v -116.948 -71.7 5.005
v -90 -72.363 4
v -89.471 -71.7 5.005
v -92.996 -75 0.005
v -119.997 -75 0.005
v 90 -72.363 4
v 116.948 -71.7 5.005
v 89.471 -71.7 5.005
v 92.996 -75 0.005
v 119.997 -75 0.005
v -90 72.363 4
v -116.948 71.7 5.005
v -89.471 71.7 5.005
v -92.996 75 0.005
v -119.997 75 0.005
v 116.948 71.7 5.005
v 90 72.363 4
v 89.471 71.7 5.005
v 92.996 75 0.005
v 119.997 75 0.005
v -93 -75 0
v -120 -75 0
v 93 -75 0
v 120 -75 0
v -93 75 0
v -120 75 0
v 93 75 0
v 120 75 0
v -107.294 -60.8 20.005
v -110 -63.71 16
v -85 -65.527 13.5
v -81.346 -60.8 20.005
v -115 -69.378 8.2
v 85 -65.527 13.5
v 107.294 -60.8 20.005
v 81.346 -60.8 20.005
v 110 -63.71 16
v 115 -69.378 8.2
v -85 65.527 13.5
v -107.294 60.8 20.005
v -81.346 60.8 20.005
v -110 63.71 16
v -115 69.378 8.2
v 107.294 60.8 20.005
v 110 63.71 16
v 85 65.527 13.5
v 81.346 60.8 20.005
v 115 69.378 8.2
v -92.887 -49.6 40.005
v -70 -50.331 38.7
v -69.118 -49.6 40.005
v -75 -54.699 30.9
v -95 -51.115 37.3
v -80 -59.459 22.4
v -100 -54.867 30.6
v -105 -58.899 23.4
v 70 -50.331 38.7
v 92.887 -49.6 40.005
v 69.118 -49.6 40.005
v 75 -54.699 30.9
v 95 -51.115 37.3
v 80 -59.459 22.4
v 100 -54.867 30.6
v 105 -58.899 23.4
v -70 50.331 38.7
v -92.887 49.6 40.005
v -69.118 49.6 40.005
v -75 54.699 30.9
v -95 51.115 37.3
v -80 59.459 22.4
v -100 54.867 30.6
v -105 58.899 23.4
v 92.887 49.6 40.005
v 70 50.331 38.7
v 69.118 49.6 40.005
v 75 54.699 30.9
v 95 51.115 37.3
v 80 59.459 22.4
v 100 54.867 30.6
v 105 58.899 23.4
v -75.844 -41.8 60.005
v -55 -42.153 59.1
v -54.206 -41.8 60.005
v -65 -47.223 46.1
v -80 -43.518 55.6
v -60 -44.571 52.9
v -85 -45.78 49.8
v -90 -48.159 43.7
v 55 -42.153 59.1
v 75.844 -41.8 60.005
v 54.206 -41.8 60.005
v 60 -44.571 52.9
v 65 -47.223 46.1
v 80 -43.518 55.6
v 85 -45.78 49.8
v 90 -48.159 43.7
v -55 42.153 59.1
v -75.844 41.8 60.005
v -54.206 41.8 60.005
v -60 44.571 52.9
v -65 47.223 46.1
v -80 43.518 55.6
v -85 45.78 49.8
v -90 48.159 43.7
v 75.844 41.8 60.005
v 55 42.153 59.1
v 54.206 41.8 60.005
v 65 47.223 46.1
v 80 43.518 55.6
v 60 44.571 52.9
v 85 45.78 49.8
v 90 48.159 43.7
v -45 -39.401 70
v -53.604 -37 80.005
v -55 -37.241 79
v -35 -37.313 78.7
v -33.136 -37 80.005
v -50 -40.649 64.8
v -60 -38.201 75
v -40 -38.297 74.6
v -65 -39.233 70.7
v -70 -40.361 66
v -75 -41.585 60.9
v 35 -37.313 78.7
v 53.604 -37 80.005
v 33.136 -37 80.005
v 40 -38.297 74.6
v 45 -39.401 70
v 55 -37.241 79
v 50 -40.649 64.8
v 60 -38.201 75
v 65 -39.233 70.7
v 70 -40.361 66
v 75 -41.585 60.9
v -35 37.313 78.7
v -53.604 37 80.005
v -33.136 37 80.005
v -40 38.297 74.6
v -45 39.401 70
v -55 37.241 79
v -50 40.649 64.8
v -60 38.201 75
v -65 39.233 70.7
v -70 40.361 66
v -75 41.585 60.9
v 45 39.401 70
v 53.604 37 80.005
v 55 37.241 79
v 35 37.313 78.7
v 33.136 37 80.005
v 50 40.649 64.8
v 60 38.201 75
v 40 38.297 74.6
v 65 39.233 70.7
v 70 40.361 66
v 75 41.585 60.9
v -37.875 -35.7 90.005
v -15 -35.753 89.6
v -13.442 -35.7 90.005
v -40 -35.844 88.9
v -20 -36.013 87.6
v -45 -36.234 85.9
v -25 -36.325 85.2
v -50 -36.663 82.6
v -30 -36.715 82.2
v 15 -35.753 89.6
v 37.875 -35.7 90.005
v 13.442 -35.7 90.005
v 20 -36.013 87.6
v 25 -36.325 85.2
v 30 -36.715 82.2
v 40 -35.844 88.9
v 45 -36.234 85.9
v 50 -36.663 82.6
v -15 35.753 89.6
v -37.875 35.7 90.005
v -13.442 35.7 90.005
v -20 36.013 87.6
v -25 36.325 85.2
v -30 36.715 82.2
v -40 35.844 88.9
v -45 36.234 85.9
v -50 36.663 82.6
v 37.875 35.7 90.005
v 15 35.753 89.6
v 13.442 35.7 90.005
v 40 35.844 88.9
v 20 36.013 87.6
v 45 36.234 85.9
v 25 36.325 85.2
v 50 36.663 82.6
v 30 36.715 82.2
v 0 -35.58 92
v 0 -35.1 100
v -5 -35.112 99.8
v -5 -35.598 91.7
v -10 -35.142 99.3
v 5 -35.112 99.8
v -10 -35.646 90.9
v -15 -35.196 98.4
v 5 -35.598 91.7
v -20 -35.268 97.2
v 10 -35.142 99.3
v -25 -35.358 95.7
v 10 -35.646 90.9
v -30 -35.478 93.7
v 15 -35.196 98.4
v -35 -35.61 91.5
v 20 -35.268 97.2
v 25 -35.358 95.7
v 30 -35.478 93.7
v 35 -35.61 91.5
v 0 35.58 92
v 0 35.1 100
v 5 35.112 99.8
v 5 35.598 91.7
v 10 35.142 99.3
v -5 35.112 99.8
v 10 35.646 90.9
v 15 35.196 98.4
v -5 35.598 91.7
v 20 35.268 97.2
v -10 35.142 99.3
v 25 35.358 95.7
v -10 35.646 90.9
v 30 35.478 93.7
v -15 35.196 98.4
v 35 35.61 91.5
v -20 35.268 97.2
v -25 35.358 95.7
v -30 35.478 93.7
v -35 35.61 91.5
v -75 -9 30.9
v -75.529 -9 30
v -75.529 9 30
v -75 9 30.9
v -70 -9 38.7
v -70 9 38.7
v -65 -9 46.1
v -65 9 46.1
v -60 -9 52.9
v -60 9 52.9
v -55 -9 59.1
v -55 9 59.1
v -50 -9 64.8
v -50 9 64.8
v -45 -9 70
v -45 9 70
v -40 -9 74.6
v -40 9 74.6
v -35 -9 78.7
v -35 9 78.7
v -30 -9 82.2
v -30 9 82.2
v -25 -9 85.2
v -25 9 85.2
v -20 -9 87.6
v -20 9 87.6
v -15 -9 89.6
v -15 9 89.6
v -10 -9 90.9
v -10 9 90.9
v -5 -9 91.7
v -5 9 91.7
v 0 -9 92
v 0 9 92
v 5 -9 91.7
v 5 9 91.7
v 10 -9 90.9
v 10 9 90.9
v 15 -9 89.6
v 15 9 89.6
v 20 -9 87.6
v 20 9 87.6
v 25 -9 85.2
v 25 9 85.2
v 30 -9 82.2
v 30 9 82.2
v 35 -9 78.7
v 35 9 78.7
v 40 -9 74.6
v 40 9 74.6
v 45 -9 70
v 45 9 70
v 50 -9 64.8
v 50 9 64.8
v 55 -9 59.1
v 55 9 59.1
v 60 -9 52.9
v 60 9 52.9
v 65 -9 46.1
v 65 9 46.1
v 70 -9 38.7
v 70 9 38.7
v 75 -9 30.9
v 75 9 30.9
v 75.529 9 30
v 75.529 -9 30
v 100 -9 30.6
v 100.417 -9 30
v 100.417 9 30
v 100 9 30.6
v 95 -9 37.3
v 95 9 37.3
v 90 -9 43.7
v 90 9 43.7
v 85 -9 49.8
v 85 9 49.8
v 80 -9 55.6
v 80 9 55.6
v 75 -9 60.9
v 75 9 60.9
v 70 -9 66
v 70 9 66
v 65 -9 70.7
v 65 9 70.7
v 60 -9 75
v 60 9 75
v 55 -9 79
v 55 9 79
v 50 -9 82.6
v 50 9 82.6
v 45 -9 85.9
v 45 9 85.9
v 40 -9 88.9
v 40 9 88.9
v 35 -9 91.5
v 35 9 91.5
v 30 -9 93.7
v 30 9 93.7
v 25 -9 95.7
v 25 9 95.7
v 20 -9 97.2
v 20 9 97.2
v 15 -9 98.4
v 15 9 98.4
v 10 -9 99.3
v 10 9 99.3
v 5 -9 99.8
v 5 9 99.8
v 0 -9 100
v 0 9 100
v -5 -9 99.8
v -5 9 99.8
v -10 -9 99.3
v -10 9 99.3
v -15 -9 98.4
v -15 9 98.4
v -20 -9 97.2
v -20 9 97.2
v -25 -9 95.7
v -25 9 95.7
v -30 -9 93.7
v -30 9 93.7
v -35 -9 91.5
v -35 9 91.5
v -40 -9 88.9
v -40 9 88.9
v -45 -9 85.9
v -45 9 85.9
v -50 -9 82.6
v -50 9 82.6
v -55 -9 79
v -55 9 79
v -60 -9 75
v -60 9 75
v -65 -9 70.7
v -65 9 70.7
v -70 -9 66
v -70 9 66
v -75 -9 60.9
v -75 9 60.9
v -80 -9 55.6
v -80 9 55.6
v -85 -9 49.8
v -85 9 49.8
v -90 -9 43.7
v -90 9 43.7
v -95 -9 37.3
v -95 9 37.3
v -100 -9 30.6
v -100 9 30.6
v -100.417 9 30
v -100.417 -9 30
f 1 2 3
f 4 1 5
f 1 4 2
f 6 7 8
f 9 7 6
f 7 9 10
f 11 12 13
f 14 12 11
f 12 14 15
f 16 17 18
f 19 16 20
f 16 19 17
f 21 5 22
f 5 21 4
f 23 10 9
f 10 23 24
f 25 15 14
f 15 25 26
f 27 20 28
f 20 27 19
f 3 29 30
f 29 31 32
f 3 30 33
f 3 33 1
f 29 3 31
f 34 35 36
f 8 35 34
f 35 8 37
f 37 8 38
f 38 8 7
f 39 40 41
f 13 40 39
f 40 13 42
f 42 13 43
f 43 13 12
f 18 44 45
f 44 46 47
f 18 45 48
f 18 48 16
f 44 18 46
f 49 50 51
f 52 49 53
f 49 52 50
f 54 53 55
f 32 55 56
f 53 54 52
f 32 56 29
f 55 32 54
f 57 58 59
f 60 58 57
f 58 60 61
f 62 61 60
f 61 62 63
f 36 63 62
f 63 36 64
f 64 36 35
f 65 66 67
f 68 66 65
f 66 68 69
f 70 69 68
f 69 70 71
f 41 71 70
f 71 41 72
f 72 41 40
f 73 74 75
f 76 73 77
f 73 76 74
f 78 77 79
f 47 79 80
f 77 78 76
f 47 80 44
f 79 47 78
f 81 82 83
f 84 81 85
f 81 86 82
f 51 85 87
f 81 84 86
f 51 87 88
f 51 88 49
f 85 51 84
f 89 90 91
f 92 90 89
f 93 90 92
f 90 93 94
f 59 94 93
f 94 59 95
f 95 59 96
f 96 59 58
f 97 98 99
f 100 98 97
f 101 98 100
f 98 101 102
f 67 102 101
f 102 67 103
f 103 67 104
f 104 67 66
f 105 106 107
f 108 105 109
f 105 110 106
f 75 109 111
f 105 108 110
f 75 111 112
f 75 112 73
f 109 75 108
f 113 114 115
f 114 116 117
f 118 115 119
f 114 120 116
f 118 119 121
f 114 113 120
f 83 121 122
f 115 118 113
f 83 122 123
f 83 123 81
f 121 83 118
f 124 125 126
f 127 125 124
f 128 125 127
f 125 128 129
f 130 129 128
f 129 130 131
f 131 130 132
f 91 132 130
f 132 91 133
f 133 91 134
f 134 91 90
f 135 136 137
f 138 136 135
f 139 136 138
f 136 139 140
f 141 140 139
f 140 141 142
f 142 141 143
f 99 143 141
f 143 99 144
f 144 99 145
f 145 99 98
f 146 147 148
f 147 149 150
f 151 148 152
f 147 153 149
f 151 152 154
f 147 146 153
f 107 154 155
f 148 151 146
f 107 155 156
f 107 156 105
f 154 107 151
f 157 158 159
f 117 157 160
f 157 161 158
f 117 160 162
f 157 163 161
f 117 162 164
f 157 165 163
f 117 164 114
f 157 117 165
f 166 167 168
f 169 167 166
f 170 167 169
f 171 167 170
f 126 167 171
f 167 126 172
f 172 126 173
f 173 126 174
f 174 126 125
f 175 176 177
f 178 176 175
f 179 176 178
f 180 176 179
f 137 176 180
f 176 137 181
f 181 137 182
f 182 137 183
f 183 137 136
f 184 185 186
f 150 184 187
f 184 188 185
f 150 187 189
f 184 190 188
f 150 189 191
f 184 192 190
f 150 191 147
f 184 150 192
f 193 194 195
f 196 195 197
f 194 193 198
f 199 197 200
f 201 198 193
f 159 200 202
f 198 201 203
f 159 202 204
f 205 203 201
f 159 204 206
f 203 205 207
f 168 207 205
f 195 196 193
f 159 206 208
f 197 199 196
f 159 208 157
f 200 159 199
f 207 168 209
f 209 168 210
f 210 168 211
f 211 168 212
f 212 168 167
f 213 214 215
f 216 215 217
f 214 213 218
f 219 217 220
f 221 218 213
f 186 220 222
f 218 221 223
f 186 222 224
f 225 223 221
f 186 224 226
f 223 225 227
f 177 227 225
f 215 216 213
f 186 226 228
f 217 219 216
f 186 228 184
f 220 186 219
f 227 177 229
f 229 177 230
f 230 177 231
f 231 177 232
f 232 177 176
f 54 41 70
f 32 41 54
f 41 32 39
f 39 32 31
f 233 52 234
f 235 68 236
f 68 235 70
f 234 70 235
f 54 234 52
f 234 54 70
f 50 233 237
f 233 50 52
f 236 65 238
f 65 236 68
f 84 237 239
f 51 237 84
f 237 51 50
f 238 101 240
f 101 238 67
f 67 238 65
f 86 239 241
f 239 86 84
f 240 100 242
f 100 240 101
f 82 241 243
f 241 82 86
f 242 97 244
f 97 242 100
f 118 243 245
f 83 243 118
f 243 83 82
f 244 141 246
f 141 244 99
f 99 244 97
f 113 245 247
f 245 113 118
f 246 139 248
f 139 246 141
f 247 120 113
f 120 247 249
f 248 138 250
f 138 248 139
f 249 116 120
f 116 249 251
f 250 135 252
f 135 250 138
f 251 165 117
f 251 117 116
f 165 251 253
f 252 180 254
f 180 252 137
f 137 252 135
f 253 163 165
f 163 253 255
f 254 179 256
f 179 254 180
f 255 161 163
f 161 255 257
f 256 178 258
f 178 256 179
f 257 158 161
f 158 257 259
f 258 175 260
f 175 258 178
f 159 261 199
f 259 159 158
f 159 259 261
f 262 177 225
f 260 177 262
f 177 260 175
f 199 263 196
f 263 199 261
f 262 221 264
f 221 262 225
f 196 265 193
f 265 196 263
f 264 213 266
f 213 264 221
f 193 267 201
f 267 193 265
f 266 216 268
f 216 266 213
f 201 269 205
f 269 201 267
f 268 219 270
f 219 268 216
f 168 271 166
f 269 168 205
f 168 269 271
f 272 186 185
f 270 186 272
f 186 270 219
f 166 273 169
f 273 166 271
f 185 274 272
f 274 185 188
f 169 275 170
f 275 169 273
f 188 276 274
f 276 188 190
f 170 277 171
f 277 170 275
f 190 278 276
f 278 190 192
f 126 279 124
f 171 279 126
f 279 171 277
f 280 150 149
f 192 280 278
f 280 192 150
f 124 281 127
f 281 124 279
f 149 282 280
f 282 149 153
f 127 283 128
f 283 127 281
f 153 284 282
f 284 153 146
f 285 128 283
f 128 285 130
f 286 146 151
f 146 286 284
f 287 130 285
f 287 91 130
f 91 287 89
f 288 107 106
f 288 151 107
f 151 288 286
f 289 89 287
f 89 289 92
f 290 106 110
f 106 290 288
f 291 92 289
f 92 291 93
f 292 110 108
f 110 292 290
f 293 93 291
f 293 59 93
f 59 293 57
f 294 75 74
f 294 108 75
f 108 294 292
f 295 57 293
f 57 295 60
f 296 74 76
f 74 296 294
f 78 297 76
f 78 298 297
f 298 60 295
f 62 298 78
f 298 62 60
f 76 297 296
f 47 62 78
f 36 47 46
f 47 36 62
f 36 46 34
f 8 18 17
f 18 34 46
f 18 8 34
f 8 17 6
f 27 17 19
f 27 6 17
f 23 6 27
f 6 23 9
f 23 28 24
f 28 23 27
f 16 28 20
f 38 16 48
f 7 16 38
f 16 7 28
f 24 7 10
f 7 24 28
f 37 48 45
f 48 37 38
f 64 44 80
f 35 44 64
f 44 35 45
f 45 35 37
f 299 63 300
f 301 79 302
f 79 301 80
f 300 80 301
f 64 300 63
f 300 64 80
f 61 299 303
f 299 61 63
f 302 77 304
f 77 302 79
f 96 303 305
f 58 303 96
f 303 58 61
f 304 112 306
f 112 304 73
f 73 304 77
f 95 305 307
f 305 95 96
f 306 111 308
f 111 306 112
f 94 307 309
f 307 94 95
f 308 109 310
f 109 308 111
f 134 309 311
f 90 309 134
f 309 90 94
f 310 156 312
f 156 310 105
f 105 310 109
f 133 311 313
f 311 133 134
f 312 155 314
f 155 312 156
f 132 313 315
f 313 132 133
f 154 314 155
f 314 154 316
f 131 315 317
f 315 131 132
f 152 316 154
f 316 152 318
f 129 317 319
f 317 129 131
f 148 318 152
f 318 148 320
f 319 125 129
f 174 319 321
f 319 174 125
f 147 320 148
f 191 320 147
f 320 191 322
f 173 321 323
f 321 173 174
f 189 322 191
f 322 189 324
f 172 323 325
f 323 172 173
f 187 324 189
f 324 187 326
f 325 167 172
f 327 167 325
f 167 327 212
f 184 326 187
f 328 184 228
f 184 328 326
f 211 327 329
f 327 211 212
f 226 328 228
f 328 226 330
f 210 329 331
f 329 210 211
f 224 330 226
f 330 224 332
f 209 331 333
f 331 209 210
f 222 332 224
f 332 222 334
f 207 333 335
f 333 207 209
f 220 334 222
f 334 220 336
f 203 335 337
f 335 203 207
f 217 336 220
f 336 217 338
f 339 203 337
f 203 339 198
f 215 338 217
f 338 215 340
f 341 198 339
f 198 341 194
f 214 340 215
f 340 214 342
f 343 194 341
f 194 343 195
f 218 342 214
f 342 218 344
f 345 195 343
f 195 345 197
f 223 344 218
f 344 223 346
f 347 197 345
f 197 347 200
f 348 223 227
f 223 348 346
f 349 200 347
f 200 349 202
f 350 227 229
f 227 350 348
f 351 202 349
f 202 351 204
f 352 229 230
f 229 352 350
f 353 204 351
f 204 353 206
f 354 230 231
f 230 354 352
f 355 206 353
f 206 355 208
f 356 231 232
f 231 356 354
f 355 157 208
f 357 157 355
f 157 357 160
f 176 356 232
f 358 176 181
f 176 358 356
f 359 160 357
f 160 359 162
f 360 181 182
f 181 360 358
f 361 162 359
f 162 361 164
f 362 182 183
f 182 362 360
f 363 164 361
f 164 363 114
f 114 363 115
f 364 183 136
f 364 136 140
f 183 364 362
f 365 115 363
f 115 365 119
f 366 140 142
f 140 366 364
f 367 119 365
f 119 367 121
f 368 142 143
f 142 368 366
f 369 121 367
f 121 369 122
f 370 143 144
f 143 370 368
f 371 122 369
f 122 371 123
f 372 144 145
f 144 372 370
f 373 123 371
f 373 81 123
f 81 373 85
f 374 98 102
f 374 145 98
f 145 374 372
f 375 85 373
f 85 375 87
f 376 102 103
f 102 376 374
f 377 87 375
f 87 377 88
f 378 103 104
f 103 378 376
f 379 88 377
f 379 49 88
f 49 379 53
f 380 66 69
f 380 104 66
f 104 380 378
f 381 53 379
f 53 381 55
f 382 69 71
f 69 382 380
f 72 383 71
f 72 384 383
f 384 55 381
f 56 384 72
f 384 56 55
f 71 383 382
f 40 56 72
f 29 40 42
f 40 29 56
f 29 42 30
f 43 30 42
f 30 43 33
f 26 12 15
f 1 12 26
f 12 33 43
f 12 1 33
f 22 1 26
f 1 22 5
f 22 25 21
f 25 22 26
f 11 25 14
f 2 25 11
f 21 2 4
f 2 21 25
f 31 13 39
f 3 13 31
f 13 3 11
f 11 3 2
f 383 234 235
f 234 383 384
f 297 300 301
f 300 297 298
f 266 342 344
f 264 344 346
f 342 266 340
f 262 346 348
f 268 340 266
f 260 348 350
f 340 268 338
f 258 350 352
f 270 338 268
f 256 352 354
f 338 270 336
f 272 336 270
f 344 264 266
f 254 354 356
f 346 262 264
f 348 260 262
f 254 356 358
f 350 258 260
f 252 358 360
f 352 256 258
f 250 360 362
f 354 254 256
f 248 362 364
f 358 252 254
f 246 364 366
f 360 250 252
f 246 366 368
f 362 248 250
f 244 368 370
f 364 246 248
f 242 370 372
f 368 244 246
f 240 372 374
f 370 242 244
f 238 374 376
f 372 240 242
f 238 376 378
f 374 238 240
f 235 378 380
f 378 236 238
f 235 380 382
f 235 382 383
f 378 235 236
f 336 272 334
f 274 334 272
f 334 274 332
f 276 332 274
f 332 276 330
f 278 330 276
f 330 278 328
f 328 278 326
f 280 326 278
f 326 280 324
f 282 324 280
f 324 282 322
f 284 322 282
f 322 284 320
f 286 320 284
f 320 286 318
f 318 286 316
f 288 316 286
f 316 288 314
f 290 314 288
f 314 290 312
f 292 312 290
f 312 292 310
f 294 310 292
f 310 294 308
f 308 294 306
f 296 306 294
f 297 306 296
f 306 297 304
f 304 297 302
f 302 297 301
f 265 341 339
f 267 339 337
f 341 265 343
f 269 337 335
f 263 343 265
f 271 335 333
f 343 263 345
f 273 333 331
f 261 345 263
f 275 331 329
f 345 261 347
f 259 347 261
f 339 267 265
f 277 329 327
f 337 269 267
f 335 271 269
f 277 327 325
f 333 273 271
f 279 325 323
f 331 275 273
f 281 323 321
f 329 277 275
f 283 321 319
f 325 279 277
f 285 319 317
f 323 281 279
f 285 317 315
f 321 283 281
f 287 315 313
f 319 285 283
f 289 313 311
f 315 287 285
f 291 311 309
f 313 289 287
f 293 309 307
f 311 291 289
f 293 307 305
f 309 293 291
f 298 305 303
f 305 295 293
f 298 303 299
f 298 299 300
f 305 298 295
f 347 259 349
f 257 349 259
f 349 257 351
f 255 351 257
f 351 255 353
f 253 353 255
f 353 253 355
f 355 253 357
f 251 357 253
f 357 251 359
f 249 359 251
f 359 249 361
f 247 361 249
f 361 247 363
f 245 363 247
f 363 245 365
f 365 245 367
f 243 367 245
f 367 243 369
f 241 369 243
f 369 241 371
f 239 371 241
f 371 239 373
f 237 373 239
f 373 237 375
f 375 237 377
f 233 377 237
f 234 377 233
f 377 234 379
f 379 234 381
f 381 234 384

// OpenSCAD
// =====================================
// Elegant Arch Laptop Stand
// A swept arch into which the closed laptop slides edge-down. The slot is a
// flat-floored channel cut straight DOWN from the crest: the laptop's bottom
// edge seats on a level floor (an XY face) between two vertical side walls,
// rather than a groove that follows the curved arch band.
// Modelled after elegant-arch-macbookpro-stand.stl (arch curves sampled
// from that mesh) but fully parametric — the slot width is sized to the
// laptop thickness.
//
// Coordinate system: Z up, base on Z=0. X = width (foot-to-foot),
// Y = depth (front-to-back), slot runs along X centred on Y=0.
// Upright/symmetric model — no viewer rotation (prints base-down).
// =====================================

$fn = 64;

// === Parameters (mm) ===
slot_gap     = 18;    // laptop slot width — set to laptop thickness + clearance
groove_depth = 70;    // how deep the laptop sinks into the arch band
stand_width  = 240;   // overall width, foot-to-foot (X)
stand_depth  = 150;   // overall depth at the base, front-to-back (Y)
stand_height = 100;   // overall height (Z)

// === Derived scale factors ===
// Arch profiles below are sampled at the reference size 240 x 150 x 100.
sx = stand_width  / 240;   // X scale
sy = stand_depth  / 150;   // Y (depth) scale
sz = stand_height / 100;   // Z scale

// Run the slot wider than the arch (full width = stand_width) so it always
// spans the whole crest, with no un-slotted band left at the shoulders. The
// feet sit below the slot floor, so the overhang never touches them.
slot_length  = stand_width + 20;

// === Sampled arch profiles (reference 240w x 100h), x = 0 .. 120 ===
// Outer silhouette: the dome top edge (front view).
outer_half = [
    [0,100.0],[5,99.8],[10,99.3],[15,98.4],[20,97.2],[25,95.7],[30,93.7],
    [35,91.5],[40,88.9],[45,85.9],[50,82.6],[55,79.0],[60,75.0],[65,70.7],
    [70,66.0],[75,60.9],[80,55.6],[85,49.8],[90,43.7],[95,37.3],[100,30.6],
    [105,23.4],[110,16.0],[115,8.2],[120,0.0]
];
// Inner silhouette: the underside of the arch opening.
inner_half = [
    [0,92.0],[5,91.7],[10,90.9],[15,89.6],[20,87.6],[25,85.2],[30,82.2],
    [35,78.7],[40,74.6],[45,70.0],[50,64.8],[55,59.1],[60,52.9],[65,46.1],
    [70,38.7],[75,30.9],[80,22.4],[85,13.5],[90,4.0],[93,0.0]
];
// Depth taper: half-depth (|Y|) of the body vs. height. Gives the scalloped
// front/back faces — wide at the base, narrowing toward the crown.
depth_half = [
    [0,75.0],[5,71.7],[20,60.8],[40,49.6],[60,41.8],[80,37.0],[90,35.7],[100,35.1]
];

// Build a full symmetric profile (x = -120 .. 120) from a positive-x half,
// scaled to the requested width/height.
function mirror_profile(half) =
    concat(
        [ for (i = [len(half)-1 : -1 : 1]) [-half[i][0]*sx, half[i][1]*sz] ],
        [ for (p = half) [p[0]*sx, p[1]*sz] ]
    );

// Filled dome silhouette (outer edge only).
module outer_2d() { polygon(mirror_profile(outer_half)); }

// === 2D arch band: filled dome minus the underside opening ===
module arch_2d() {
    difference() {
        outer_2d();
        polygon(mirror_profile(inner_half));
    }
}

// === Depth-taper mask: tapered slab stack spanning the full width ===
module depth_mask() {
    w = stand_width + 2;
    for (i = [0 : len(depth_half)-2]) {
        z0 = depth_half[i][0]   * sz;  hd0 = depth_half[i][1]   * sy;
        z1 = depth_half[i+1][0] * sz;  hd1 = depth_half[i+1][1] * sy;
        hull() {
            translate([0, 0, z0]) cube([w, 2*hd0, 0.01], center = true);
            translate([0, 0, z1]) cube([w, 2*hd1, 0.01], center = true);
        }
    }
}

// === Central laptop slot — flat-floored channel cut into the arch band ===
// A rectangular channel, slot_gap wide in Y and slot_length long in X, cut
// straight DOWN from above to a flat horizontal floor at floor_z. All material
// stays within the arch band, so the slot's vertical side walls (XZ faces at
// Y = +/- slot_gap/2) follow the band over the crest and the laptop's bottom
// edge seats where the band drops below floor_z near the legs — there is no
// continuous floor bridging the two sides of the arch opening.
module slot_cut() {
    floor_z = stand_height - groove_depth;   // height of the flat seating floor
    translate([-slot_length/2, -slot_gap/2, floor_z])
        cube([slot_length, slot_gap, stand_height + 2 - floor_z]);
}

// === Assembly ===
module laptop_stand() {
    difference() {
        intersection() {
            rotate([90, 0, 0])
                linear_extrude(height = stand_depth + 2, center = true)
                    arch_2d();
            depth_mask();
        }
        slot_cut();
    }
}

laptop_stand();
